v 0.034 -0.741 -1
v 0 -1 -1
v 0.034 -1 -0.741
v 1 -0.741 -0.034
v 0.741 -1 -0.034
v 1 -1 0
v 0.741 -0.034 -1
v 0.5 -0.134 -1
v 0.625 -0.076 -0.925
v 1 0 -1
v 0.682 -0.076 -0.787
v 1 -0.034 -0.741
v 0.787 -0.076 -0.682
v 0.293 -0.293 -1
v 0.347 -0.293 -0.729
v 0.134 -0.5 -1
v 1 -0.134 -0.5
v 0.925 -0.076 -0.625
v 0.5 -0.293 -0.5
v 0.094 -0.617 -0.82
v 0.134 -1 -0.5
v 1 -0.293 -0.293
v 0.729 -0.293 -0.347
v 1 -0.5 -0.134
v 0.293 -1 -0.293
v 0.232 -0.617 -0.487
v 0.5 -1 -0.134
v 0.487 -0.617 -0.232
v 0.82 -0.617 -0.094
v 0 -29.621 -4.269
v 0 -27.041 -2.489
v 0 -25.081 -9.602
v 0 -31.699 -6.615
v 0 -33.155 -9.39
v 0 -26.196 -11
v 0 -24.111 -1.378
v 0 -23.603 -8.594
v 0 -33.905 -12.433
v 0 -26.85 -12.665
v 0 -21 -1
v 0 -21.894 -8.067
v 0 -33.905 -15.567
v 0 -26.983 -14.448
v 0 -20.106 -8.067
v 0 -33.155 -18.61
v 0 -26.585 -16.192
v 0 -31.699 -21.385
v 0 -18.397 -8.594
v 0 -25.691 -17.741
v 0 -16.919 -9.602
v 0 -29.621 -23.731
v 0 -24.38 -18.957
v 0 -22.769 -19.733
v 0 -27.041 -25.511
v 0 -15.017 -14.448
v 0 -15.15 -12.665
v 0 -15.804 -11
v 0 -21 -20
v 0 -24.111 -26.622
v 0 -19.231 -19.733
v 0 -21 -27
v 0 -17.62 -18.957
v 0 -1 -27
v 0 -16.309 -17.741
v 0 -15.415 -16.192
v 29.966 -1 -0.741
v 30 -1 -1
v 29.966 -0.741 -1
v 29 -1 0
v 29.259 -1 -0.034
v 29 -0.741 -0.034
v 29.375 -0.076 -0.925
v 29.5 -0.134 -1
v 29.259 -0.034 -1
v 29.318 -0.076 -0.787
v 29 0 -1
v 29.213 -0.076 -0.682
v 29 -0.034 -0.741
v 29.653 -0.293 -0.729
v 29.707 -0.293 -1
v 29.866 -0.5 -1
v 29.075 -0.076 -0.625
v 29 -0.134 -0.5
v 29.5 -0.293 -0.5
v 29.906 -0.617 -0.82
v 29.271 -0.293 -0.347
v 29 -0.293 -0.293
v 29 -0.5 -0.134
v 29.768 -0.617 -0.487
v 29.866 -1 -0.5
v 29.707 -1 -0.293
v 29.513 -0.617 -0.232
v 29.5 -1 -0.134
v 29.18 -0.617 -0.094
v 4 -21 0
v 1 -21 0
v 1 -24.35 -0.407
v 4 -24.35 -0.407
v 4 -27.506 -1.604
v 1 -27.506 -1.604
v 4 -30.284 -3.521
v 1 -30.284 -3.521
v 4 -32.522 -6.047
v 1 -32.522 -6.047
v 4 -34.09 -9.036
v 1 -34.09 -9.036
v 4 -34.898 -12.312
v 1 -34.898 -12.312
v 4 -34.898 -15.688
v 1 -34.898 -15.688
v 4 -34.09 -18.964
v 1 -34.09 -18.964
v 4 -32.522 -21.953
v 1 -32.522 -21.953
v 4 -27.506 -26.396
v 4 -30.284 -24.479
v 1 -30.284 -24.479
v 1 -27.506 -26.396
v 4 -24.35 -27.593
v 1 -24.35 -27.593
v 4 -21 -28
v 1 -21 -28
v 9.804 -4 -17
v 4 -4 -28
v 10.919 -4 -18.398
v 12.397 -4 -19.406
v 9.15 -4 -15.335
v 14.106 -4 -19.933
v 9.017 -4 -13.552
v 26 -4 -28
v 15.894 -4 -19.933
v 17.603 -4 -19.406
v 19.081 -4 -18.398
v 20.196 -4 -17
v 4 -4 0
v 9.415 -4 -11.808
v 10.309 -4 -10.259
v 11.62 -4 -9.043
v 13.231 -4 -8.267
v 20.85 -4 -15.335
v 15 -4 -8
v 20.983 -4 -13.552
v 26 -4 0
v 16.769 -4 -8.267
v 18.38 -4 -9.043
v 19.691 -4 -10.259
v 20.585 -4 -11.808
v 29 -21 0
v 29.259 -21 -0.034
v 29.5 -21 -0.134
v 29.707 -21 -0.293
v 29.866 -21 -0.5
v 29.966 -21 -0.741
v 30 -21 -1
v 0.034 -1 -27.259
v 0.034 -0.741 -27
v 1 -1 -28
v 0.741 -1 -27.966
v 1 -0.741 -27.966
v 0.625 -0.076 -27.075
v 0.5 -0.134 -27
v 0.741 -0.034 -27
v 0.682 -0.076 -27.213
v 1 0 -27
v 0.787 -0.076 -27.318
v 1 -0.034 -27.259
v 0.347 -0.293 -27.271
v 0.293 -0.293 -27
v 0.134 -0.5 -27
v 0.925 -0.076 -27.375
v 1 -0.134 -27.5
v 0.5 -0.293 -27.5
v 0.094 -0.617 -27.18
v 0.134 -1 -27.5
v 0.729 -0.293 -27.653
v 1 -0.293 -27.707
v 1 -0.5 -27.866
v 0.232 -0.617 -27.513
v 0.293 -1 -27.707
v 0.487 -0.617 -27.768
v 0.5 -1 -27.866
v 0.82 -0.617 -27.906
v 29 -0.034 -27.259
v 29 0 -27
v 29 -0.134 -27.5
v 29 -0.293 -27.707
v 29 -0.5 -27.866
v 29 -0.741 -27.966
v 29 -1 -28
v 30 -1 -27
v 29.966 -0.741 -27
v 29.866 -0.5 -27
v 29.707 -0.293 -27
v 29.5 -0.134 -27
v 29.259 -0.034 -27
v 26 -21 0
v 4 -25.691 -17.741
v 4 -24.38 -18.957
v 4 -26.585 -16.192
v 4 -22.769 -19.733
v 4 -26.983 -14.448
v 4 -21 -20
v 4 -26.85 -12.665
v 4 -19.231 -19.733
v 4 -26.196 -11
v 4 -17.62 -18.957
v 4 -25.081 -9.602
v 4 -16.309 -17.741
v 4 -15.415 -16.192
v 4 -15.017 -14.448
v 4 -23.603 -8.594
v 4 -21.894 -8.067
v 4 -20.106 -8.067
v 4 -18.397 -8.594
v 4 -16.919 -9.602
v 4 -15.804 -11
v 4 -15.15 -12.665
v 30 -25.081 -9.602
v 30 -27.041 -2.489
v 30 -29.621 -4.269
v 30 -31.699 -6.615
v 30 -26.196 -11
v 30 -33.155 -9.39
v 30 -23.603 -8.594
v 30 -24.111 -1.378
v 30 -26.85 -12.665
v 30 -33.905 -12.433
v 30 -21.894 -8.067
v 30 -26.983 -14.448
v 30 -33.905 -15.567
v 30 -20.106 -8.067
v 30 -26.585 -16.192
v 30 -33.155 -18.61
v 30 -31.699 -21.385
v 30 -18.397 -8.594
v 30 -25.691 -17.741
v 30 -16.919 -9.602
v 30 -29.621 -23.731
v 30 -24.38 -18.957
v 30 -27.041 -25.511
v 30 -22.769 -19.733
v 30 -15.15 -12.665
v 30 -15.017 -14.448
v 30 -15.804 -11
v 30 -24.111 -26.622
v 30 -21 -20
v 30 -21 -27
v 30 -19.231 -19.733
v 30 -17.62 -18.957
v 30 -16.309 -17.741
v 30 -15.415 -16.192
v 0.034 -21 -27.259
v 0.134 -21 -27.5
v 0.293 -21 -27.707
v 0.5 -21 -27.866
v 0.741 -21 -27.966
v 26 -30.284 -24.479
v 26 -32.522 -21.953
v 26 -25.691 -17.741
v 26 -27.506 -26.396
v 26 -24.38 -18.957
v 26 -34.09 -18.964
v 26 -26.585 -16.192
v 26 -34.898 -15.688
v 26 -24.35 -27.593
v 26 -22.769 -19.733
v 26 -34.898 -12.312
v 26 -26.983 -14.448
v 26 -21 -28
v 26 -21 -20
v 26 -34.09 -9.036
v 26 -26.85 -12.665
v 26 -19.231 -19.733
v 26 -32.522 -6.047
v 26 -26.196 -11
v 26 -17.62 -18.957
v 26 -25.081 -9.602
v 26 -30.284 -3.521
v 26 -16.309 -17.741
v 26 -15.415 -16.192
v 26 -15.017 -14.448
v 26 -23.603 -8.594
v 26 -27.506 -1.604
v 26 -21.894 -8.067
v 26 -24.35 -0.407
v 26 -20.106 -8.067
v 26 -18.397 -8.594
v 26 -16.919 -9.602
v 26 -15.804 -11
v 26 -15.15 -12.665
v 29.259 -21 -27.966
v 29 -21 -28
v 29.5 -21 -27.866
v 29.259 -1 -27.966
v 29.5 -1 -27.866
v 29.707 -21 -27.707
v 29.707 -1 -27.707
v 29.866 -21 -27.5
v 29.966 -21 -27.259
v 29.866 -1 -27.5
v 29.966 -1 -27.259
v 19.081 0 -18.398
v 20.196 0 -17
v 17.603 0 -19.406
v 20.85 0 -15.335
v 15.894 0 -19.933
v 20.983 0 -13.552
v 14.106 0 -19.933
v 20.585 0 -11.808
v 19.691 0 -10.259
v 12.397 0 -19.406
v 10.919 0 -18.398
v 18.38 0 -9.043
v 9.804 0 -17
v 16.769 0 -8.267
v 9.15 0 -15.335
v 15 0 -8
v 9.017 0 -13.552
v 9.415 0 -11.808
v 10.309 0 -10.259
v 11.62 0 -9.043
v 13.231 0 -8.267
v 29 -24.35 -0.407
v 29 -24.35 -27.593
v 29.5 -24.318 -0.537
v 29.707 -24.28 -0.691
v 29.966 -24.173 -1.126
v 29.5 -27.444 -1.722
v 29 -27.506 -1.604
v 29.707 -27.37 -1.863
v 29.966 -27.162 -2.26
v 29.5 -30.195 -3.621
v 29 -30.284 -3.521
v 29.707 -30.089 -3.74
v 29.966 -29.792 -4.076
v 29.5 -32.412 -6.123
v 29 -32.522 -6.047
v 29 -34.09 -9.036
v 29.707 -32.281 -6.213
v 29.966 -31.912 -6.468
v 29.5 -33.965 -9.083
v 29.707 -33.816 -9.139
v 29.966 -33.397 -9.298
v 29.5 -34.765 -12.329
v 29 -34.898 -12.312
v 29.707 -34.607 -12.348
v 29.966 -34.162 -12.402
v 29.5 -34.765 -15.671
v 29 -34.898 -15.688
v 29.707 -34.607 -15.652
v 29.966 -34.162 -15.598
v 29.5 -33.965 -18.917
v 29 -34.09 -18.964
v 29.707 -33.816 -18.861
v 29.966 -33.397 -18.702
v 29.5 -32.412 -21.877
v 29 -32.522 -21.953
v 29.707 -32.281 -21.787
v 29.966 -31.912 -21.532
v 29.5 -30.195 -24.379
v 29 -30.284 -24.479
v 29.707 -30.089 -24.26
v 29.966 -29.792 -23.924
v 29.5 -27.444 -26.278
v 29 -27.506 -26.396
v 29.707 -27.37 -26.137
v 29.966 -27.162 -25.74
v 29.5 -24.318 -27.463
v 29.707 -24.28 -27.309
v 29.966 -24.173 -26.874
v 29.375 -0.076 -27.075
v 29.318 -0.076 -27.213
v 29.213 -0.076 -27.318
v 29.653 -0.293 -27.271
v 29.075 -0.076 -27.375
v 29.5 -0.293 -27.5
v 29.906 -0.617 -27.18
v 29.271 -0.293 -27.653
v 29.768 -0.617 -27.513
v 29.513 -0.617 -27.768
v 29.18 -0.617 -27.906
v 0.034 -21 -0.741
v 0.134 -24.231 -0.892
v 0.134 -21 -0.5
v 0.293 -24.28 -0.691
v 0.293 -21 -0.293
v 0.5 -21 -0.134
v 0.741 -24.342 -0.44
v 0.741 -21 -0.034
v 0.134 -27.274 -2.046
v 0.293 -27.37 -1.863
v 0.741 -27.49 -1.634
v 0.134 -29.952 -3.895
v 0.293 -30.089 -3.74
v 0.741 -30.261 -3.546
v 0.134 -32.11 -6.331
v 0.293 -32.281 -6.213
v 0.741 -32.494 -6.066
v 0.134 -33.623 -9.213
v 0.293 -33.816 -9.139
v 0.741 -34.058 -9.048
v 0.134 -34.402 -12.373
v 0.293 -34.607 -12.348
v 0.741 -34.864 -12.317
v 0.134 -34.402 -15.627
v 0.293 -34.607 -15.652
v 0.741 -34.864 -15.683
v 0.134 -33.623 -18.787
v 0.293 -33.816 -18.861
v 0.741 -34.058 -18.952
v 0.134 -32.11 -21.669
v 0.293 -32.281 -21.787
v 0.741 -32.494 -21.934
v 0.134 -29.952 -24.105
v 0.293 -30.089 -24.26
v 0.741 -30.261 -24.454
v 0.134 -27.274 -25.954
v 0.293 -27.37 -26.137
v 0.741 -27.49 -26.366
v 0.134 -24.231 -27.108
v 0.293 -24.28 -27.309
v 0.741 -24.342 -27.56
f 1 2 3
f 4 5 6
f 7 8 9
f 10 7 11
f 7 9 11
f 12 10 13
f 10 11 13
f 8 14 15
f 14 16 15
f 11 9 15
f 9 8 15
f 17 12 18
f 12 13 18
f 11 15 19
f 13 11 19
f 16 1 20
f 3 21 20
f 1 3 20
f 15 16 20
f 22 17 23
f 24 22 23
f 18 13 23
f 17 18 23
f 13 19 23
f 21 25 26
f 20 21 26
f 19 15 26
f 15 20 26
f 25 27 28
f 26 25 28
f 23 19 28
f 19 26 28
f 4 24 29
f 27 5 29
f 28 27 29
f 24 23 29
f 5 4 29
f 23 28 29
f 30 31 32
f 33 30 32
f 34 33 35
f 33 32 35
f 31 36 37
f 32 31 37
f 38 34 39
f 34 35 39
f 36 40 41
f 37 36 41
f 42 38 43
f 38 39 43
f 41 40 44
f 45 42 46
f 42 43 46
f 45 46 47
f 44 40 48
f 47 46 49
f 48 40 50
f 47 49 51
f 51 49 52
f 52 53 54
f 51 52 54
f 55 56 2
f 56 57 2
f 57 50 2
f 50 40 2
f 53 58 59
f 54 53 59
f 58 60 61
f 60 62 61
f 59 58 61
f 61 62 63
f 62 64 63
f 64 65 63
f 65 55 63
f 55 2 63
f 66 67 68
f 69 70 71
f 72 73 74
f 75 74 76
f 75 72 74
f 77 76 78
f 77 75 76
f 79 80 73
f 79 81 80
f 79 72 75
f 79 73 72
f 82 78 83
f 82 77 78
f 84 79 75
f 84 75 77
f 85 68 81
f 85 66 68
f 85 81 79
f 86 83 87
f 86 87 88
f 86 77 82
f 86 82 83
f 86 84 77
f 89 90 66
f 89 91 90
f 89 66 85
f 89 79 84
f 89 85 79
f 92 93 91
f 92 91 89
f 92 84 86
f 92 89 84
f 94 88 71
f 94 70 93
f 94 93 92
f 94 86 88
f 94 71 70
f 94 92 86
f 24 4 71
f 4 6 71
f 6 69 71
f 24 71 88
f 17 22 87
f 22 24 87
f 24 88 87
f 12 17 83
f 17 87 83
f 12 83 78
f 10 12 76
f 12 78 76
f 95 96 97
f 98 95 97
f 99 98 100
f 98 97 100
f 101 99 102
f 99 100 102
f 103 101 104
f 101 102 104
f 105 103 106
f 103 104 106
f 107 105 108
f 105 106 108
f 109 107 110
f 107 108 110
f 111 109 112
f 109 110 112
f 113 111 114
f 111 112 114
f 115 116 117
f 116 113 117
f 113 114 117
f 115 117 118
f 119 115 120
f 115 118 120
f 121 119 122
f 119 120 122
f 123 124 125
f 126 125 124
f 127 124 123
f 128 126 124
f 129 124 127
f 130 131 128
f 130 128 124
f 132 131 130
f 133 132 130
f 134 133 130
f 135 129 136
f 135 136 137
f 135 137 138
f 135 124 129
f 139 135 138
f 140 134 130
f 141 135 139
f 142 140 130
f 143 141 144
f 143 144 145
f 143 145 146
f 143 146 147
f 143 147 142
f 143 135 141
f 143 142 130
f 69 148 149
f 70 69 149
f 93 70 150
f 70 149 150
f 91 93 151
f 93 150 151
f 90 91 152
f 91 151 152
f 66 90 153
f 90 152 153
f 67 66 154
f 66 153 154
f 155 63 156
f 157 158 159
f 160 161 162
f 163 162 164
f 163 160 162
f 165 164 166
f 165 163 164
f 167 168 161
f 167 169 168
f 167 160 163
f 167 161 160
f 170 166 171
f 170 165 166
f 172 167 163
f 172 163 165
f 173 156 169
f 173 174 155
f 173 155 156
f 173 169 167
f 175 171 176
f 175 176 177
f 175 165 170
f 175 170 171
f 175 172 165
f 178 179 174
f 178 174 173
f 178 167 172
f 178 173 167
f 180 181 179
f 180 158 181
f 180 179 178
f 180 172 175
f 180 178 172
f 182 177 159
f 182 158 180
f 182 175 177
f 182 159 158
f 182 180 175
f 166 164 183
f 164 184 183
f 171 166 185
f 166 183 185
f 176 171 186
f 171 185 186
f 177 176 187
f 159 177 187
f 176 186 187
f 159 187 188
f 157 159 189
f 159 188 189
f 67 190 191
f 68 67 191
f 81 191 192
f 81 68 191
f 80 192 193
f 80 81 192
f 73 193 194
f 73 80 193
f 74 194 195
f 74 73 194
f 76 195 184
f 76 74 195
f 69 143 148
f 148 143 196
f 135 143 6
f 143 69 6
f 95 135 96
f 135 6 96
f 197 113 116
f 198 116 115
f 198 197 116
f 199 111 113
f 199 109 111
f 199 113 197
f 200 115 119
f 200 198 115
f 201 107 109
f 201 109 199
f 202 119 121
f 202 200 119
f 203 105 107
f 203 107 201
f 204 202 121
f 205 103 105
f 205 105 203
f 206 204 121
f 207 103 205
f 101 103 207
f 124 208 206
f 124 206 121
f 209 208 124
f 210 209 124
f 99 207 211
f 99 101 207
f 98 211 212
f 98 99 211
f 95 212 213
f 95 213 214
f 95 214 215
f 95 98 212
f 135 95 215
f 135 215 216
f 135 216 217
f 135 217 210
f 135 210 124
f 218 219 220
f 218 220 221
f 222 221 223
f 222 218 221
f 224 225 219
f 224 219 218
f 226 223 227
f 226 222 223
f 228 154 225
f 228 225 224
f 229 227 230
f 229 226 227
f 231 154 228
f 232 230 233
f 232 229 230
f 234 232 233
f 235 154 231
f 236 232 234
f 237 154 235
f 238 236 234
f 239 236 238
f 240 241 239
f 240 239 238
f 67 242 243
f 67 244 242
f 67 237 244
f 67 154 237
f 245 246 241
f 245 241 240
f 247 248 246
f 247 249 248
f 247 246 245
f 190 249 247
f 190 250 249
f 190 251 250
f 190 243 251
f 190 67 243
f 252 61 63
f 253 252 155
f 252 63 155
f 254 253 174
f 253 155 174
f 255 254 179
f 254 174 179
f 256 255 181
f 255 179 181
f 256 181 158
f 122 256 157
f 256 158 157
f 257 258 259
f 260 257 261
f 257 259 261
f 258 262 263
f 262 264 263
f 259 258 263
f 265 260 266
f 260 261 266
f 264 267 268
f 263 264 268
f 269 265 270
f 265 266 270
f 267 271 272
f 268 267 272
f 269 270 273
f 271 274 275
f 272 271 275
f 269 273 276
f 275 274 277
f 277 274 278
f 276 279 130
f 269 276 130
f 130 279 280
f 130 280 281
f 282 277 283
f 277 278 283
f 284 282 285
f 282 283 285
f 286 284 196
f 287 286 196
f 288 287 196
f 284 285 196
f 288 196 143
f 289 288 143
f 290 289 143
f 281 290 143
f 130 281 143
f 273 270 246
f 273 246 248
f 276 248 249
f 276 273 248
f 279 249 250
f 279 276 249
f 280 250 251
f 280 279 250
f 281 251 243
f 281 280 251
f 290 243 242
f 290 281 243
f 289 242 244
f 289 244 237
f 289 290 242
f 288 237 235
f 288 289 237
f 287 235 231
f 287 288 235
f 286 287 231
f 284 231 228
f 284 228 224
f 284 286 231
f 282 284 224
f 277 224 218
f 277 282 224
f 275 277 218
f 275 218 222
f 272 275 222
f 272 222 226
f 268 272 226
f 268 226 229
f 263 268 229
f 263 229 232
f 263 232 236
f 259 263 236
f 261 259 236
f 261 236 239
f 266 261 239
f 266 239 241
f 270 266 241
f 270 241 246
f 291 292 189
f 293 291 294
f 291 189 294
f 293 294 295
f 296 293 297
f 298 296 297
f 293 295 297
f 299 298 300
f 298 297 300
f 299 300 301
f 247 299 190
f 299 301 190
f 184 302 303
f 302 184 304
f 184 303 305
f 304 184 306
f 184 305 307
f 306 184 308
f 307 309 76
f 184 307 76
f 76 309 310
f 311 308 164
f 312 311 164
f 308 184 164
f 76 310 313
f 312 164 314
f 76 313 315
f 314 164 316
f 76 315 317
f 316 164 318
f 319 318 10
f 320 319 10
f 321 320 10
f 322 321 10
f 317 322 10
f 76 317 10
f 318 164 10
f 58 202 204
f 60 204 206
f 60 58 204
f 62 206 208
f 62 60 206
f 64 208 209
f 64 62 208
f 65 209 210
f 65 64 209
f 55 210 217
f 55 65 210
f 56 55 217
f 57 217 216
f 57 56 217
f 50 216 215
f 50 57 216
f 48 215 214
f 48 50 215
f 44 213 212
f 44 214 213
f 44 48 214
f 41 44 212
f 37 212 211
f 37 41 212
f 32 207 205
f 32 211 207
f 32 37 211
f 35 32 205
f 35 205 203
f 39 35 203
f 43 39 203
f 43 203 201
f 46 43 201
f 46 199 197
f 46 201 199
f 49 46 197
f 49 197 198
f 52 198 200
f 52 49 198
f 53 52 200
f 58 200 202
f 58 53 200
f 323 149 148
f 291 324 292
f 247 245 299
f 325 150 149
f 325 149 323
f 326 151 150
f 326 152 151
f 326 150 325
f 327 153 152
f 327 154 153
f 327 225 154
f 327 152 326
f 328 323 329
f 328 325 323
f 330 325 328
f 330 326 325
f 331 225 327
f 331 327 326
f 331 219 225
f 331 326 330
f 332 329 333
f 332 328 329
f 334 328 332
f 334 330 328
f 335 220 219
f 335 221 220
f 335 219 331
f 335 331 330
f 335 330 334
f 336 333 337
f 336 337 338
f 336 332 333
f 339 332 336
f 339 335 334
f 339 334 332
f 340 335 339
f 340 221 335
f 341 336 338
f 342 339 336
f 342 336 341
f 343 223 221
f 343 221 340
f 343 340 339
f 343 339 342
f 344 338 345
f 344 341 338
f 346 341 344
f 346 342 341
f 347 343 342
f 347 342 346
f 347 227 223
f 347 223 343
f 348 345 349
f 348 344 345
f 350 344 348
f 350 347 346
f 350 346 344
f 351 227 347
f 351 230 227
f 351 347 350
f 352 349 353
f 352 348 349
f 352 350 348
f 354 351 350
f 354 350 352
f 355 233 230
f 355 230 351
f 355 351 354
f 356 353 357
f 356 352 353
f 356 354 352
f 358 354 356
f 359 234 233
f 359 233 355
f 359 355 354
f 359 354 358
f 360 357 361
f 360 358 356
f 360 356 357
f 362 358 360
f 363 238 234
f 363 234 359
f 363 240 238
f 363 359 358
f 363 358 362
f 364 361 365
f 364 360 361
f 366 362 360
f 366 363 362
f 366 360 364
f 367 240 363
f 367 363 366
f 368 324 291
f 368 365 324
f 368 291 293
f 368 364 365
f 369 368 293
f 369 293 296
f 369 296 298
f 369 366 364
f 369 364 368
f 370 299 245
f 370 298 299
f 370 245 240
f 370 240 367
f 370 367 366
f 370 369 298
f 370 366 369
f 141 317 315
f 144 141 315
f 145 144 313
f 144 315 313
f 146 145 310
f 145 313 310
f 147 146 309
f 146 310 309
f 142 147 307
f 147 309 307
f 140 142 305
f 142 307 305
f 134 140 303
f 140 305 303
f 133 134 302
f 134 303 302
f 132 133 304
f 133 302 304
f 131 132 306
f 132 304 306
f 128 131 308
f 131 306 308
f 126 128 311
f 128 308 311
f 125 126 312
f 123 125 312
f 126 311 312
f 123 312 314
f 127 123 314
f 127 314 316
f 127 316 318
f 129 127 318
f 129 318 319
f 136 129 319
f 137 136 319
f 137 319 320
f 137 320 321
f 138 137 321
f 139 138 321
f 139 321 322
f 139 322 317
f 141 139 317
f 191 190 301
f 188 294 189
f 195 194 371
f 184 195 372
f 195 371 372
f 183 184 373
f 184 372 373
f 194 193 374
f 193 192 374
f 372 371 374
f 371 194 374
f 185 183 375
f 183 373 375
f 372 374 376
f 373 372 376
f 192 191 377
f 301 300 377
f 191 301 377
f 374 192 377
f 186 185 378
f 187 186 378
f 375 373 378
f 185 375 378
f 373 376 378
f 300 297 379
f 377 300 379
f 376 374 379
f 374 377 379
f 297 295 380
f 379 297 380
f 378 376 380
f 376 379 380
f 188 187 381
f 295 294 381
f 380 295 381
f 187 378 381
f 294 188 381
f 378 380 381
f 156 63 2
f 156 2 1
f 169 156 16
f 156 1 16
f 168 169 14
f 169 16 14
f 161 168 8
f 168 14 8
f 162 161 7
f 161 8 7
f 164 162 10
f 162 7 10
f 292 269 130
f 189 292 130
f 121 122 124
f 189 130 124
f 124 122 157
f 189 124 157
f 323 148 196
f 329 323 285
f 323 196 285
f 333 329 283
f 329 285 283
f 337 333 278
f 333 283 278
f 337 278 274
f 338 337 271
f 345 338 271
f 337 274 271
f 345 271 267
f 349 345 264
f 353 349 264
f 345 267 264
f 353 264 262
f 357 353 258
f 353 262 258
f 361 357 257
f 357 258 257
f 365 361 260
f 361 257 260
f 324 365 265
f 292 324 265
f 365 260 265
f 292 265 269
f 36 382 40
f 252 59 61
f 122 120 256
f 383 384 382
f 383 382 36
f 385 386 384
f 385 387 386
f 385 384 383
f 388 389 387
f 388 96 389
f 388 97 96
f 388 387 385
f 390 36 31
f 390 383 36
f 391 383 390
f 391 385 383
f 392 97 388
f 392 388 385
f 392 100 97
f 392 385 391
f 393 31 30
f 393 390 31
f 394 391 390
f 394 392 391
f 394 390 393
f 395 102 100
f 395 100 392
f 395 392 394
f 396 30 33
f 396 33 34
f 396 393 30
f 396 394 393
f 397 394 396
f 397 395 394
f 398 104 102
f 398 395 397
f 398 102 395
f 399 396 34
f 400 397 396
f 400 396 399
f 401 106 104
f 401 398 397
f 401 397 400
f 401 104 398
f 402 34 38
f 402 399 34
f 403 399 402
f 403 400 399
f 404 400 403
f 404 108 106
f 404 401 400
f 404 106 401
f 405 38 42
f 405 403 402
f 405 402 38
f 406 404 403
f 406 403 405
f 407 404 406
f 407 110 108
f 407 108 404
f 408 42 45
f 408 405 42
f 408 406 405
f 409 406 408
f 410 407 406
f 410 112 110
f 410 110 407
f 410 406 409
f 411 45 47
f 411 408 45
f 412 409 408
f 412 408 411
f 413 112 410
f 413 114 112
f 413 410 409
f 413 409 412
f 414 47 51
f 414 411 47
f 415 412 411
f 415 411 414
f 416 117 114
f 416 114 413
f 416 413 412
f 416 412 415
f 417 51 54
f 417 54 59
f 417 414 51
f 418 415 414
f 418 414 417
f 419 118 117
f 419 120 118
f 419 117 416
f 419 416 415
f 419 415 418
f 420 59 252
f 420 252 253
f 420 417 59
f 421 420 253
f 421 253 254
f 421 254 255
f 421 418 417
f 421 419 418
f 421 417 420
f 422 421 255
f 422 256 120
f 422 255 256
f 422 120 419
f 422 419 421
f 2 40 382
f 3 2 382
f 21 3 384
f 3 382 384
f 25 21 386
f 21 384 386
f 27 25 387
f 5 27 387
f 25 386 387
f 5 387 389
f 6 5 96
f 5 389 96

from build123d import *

# Parameters (mm, degrees)
SKETCH_1_R          = 6
EXTRUDE_1_DEPTH     = 30
SKETCH_2_W          = 22
SKETCH_2_H          = 31
CUT_EXTRUDE_2_DEPTH = 54.935146241
SKETCH_3_R          = 6
CUT_EXTRUDE_3_DEPTH = 30
FILLET_1_R          = 1


with BuildPart() as part:
    # 草图1 → 拉伸1 (new body)
    with BuildSketch(Plane(origin=(0, 0, 0), x_dir=(0, 0, -1), z_dir=(1, 0, 0))):
        with BuildLine():
            Line((0, 0), (0, -21))
            ThreePointArc((0, -21), (14, -35), (28, -21))
            Line((28, -21), (28, 0))
            Line((28, 0), (0, 0))
        make_face()
        with Locations((14, -21)):
            Circle(SKETCH_1_R, mode=Mode.SUBTRACT)
    extrude(amount=EXTRUDE_1_DEPTH)

    # 草图2 → 拉伸2 (cut, through all)
    with BuildSketch(Plane.XY):
        with Locations((15, -19.5)):
            Rectangle(SKETCH_2_W, SKETCH_2_H)
    extrude(amount=-CUT_EXTRUDE_2_DEPTH, mode=Mode.SUBTRACT)

    # 草图3 → 拉伸3 (cut)
    with BuildSketch(Plane(origin=(0, 0, 0), x_dir=(1, 0, 0), z_dir=(0, 1, 0))):
        with Locations(Location((15, 14, 0), (0, 0, 270))):
            Circle(SKETCH_3_R)
    extrude(amount=-CUT_EXTRUDE_3_DEPTH, mode=Mode.SUBTRACT)

    # 圆角1
    fillet_1_edges = [part.edges().sort_by_distance(p)[0] for p in [
        (30, -35, -14),
        (30, -10.5, -28),
        (30, 0, -14),
        (0, -10.5, -28),
        (0, -35, -14),
        (0, -10.5, 0),
        (0, 0, -14),
        (30, -10.5, 0),
        (15, 0, -28),
        (15, 0, 0),
    ]]
    fillet(fillet_1_edges, radius=FILLET_1_R)


solid = part.part
